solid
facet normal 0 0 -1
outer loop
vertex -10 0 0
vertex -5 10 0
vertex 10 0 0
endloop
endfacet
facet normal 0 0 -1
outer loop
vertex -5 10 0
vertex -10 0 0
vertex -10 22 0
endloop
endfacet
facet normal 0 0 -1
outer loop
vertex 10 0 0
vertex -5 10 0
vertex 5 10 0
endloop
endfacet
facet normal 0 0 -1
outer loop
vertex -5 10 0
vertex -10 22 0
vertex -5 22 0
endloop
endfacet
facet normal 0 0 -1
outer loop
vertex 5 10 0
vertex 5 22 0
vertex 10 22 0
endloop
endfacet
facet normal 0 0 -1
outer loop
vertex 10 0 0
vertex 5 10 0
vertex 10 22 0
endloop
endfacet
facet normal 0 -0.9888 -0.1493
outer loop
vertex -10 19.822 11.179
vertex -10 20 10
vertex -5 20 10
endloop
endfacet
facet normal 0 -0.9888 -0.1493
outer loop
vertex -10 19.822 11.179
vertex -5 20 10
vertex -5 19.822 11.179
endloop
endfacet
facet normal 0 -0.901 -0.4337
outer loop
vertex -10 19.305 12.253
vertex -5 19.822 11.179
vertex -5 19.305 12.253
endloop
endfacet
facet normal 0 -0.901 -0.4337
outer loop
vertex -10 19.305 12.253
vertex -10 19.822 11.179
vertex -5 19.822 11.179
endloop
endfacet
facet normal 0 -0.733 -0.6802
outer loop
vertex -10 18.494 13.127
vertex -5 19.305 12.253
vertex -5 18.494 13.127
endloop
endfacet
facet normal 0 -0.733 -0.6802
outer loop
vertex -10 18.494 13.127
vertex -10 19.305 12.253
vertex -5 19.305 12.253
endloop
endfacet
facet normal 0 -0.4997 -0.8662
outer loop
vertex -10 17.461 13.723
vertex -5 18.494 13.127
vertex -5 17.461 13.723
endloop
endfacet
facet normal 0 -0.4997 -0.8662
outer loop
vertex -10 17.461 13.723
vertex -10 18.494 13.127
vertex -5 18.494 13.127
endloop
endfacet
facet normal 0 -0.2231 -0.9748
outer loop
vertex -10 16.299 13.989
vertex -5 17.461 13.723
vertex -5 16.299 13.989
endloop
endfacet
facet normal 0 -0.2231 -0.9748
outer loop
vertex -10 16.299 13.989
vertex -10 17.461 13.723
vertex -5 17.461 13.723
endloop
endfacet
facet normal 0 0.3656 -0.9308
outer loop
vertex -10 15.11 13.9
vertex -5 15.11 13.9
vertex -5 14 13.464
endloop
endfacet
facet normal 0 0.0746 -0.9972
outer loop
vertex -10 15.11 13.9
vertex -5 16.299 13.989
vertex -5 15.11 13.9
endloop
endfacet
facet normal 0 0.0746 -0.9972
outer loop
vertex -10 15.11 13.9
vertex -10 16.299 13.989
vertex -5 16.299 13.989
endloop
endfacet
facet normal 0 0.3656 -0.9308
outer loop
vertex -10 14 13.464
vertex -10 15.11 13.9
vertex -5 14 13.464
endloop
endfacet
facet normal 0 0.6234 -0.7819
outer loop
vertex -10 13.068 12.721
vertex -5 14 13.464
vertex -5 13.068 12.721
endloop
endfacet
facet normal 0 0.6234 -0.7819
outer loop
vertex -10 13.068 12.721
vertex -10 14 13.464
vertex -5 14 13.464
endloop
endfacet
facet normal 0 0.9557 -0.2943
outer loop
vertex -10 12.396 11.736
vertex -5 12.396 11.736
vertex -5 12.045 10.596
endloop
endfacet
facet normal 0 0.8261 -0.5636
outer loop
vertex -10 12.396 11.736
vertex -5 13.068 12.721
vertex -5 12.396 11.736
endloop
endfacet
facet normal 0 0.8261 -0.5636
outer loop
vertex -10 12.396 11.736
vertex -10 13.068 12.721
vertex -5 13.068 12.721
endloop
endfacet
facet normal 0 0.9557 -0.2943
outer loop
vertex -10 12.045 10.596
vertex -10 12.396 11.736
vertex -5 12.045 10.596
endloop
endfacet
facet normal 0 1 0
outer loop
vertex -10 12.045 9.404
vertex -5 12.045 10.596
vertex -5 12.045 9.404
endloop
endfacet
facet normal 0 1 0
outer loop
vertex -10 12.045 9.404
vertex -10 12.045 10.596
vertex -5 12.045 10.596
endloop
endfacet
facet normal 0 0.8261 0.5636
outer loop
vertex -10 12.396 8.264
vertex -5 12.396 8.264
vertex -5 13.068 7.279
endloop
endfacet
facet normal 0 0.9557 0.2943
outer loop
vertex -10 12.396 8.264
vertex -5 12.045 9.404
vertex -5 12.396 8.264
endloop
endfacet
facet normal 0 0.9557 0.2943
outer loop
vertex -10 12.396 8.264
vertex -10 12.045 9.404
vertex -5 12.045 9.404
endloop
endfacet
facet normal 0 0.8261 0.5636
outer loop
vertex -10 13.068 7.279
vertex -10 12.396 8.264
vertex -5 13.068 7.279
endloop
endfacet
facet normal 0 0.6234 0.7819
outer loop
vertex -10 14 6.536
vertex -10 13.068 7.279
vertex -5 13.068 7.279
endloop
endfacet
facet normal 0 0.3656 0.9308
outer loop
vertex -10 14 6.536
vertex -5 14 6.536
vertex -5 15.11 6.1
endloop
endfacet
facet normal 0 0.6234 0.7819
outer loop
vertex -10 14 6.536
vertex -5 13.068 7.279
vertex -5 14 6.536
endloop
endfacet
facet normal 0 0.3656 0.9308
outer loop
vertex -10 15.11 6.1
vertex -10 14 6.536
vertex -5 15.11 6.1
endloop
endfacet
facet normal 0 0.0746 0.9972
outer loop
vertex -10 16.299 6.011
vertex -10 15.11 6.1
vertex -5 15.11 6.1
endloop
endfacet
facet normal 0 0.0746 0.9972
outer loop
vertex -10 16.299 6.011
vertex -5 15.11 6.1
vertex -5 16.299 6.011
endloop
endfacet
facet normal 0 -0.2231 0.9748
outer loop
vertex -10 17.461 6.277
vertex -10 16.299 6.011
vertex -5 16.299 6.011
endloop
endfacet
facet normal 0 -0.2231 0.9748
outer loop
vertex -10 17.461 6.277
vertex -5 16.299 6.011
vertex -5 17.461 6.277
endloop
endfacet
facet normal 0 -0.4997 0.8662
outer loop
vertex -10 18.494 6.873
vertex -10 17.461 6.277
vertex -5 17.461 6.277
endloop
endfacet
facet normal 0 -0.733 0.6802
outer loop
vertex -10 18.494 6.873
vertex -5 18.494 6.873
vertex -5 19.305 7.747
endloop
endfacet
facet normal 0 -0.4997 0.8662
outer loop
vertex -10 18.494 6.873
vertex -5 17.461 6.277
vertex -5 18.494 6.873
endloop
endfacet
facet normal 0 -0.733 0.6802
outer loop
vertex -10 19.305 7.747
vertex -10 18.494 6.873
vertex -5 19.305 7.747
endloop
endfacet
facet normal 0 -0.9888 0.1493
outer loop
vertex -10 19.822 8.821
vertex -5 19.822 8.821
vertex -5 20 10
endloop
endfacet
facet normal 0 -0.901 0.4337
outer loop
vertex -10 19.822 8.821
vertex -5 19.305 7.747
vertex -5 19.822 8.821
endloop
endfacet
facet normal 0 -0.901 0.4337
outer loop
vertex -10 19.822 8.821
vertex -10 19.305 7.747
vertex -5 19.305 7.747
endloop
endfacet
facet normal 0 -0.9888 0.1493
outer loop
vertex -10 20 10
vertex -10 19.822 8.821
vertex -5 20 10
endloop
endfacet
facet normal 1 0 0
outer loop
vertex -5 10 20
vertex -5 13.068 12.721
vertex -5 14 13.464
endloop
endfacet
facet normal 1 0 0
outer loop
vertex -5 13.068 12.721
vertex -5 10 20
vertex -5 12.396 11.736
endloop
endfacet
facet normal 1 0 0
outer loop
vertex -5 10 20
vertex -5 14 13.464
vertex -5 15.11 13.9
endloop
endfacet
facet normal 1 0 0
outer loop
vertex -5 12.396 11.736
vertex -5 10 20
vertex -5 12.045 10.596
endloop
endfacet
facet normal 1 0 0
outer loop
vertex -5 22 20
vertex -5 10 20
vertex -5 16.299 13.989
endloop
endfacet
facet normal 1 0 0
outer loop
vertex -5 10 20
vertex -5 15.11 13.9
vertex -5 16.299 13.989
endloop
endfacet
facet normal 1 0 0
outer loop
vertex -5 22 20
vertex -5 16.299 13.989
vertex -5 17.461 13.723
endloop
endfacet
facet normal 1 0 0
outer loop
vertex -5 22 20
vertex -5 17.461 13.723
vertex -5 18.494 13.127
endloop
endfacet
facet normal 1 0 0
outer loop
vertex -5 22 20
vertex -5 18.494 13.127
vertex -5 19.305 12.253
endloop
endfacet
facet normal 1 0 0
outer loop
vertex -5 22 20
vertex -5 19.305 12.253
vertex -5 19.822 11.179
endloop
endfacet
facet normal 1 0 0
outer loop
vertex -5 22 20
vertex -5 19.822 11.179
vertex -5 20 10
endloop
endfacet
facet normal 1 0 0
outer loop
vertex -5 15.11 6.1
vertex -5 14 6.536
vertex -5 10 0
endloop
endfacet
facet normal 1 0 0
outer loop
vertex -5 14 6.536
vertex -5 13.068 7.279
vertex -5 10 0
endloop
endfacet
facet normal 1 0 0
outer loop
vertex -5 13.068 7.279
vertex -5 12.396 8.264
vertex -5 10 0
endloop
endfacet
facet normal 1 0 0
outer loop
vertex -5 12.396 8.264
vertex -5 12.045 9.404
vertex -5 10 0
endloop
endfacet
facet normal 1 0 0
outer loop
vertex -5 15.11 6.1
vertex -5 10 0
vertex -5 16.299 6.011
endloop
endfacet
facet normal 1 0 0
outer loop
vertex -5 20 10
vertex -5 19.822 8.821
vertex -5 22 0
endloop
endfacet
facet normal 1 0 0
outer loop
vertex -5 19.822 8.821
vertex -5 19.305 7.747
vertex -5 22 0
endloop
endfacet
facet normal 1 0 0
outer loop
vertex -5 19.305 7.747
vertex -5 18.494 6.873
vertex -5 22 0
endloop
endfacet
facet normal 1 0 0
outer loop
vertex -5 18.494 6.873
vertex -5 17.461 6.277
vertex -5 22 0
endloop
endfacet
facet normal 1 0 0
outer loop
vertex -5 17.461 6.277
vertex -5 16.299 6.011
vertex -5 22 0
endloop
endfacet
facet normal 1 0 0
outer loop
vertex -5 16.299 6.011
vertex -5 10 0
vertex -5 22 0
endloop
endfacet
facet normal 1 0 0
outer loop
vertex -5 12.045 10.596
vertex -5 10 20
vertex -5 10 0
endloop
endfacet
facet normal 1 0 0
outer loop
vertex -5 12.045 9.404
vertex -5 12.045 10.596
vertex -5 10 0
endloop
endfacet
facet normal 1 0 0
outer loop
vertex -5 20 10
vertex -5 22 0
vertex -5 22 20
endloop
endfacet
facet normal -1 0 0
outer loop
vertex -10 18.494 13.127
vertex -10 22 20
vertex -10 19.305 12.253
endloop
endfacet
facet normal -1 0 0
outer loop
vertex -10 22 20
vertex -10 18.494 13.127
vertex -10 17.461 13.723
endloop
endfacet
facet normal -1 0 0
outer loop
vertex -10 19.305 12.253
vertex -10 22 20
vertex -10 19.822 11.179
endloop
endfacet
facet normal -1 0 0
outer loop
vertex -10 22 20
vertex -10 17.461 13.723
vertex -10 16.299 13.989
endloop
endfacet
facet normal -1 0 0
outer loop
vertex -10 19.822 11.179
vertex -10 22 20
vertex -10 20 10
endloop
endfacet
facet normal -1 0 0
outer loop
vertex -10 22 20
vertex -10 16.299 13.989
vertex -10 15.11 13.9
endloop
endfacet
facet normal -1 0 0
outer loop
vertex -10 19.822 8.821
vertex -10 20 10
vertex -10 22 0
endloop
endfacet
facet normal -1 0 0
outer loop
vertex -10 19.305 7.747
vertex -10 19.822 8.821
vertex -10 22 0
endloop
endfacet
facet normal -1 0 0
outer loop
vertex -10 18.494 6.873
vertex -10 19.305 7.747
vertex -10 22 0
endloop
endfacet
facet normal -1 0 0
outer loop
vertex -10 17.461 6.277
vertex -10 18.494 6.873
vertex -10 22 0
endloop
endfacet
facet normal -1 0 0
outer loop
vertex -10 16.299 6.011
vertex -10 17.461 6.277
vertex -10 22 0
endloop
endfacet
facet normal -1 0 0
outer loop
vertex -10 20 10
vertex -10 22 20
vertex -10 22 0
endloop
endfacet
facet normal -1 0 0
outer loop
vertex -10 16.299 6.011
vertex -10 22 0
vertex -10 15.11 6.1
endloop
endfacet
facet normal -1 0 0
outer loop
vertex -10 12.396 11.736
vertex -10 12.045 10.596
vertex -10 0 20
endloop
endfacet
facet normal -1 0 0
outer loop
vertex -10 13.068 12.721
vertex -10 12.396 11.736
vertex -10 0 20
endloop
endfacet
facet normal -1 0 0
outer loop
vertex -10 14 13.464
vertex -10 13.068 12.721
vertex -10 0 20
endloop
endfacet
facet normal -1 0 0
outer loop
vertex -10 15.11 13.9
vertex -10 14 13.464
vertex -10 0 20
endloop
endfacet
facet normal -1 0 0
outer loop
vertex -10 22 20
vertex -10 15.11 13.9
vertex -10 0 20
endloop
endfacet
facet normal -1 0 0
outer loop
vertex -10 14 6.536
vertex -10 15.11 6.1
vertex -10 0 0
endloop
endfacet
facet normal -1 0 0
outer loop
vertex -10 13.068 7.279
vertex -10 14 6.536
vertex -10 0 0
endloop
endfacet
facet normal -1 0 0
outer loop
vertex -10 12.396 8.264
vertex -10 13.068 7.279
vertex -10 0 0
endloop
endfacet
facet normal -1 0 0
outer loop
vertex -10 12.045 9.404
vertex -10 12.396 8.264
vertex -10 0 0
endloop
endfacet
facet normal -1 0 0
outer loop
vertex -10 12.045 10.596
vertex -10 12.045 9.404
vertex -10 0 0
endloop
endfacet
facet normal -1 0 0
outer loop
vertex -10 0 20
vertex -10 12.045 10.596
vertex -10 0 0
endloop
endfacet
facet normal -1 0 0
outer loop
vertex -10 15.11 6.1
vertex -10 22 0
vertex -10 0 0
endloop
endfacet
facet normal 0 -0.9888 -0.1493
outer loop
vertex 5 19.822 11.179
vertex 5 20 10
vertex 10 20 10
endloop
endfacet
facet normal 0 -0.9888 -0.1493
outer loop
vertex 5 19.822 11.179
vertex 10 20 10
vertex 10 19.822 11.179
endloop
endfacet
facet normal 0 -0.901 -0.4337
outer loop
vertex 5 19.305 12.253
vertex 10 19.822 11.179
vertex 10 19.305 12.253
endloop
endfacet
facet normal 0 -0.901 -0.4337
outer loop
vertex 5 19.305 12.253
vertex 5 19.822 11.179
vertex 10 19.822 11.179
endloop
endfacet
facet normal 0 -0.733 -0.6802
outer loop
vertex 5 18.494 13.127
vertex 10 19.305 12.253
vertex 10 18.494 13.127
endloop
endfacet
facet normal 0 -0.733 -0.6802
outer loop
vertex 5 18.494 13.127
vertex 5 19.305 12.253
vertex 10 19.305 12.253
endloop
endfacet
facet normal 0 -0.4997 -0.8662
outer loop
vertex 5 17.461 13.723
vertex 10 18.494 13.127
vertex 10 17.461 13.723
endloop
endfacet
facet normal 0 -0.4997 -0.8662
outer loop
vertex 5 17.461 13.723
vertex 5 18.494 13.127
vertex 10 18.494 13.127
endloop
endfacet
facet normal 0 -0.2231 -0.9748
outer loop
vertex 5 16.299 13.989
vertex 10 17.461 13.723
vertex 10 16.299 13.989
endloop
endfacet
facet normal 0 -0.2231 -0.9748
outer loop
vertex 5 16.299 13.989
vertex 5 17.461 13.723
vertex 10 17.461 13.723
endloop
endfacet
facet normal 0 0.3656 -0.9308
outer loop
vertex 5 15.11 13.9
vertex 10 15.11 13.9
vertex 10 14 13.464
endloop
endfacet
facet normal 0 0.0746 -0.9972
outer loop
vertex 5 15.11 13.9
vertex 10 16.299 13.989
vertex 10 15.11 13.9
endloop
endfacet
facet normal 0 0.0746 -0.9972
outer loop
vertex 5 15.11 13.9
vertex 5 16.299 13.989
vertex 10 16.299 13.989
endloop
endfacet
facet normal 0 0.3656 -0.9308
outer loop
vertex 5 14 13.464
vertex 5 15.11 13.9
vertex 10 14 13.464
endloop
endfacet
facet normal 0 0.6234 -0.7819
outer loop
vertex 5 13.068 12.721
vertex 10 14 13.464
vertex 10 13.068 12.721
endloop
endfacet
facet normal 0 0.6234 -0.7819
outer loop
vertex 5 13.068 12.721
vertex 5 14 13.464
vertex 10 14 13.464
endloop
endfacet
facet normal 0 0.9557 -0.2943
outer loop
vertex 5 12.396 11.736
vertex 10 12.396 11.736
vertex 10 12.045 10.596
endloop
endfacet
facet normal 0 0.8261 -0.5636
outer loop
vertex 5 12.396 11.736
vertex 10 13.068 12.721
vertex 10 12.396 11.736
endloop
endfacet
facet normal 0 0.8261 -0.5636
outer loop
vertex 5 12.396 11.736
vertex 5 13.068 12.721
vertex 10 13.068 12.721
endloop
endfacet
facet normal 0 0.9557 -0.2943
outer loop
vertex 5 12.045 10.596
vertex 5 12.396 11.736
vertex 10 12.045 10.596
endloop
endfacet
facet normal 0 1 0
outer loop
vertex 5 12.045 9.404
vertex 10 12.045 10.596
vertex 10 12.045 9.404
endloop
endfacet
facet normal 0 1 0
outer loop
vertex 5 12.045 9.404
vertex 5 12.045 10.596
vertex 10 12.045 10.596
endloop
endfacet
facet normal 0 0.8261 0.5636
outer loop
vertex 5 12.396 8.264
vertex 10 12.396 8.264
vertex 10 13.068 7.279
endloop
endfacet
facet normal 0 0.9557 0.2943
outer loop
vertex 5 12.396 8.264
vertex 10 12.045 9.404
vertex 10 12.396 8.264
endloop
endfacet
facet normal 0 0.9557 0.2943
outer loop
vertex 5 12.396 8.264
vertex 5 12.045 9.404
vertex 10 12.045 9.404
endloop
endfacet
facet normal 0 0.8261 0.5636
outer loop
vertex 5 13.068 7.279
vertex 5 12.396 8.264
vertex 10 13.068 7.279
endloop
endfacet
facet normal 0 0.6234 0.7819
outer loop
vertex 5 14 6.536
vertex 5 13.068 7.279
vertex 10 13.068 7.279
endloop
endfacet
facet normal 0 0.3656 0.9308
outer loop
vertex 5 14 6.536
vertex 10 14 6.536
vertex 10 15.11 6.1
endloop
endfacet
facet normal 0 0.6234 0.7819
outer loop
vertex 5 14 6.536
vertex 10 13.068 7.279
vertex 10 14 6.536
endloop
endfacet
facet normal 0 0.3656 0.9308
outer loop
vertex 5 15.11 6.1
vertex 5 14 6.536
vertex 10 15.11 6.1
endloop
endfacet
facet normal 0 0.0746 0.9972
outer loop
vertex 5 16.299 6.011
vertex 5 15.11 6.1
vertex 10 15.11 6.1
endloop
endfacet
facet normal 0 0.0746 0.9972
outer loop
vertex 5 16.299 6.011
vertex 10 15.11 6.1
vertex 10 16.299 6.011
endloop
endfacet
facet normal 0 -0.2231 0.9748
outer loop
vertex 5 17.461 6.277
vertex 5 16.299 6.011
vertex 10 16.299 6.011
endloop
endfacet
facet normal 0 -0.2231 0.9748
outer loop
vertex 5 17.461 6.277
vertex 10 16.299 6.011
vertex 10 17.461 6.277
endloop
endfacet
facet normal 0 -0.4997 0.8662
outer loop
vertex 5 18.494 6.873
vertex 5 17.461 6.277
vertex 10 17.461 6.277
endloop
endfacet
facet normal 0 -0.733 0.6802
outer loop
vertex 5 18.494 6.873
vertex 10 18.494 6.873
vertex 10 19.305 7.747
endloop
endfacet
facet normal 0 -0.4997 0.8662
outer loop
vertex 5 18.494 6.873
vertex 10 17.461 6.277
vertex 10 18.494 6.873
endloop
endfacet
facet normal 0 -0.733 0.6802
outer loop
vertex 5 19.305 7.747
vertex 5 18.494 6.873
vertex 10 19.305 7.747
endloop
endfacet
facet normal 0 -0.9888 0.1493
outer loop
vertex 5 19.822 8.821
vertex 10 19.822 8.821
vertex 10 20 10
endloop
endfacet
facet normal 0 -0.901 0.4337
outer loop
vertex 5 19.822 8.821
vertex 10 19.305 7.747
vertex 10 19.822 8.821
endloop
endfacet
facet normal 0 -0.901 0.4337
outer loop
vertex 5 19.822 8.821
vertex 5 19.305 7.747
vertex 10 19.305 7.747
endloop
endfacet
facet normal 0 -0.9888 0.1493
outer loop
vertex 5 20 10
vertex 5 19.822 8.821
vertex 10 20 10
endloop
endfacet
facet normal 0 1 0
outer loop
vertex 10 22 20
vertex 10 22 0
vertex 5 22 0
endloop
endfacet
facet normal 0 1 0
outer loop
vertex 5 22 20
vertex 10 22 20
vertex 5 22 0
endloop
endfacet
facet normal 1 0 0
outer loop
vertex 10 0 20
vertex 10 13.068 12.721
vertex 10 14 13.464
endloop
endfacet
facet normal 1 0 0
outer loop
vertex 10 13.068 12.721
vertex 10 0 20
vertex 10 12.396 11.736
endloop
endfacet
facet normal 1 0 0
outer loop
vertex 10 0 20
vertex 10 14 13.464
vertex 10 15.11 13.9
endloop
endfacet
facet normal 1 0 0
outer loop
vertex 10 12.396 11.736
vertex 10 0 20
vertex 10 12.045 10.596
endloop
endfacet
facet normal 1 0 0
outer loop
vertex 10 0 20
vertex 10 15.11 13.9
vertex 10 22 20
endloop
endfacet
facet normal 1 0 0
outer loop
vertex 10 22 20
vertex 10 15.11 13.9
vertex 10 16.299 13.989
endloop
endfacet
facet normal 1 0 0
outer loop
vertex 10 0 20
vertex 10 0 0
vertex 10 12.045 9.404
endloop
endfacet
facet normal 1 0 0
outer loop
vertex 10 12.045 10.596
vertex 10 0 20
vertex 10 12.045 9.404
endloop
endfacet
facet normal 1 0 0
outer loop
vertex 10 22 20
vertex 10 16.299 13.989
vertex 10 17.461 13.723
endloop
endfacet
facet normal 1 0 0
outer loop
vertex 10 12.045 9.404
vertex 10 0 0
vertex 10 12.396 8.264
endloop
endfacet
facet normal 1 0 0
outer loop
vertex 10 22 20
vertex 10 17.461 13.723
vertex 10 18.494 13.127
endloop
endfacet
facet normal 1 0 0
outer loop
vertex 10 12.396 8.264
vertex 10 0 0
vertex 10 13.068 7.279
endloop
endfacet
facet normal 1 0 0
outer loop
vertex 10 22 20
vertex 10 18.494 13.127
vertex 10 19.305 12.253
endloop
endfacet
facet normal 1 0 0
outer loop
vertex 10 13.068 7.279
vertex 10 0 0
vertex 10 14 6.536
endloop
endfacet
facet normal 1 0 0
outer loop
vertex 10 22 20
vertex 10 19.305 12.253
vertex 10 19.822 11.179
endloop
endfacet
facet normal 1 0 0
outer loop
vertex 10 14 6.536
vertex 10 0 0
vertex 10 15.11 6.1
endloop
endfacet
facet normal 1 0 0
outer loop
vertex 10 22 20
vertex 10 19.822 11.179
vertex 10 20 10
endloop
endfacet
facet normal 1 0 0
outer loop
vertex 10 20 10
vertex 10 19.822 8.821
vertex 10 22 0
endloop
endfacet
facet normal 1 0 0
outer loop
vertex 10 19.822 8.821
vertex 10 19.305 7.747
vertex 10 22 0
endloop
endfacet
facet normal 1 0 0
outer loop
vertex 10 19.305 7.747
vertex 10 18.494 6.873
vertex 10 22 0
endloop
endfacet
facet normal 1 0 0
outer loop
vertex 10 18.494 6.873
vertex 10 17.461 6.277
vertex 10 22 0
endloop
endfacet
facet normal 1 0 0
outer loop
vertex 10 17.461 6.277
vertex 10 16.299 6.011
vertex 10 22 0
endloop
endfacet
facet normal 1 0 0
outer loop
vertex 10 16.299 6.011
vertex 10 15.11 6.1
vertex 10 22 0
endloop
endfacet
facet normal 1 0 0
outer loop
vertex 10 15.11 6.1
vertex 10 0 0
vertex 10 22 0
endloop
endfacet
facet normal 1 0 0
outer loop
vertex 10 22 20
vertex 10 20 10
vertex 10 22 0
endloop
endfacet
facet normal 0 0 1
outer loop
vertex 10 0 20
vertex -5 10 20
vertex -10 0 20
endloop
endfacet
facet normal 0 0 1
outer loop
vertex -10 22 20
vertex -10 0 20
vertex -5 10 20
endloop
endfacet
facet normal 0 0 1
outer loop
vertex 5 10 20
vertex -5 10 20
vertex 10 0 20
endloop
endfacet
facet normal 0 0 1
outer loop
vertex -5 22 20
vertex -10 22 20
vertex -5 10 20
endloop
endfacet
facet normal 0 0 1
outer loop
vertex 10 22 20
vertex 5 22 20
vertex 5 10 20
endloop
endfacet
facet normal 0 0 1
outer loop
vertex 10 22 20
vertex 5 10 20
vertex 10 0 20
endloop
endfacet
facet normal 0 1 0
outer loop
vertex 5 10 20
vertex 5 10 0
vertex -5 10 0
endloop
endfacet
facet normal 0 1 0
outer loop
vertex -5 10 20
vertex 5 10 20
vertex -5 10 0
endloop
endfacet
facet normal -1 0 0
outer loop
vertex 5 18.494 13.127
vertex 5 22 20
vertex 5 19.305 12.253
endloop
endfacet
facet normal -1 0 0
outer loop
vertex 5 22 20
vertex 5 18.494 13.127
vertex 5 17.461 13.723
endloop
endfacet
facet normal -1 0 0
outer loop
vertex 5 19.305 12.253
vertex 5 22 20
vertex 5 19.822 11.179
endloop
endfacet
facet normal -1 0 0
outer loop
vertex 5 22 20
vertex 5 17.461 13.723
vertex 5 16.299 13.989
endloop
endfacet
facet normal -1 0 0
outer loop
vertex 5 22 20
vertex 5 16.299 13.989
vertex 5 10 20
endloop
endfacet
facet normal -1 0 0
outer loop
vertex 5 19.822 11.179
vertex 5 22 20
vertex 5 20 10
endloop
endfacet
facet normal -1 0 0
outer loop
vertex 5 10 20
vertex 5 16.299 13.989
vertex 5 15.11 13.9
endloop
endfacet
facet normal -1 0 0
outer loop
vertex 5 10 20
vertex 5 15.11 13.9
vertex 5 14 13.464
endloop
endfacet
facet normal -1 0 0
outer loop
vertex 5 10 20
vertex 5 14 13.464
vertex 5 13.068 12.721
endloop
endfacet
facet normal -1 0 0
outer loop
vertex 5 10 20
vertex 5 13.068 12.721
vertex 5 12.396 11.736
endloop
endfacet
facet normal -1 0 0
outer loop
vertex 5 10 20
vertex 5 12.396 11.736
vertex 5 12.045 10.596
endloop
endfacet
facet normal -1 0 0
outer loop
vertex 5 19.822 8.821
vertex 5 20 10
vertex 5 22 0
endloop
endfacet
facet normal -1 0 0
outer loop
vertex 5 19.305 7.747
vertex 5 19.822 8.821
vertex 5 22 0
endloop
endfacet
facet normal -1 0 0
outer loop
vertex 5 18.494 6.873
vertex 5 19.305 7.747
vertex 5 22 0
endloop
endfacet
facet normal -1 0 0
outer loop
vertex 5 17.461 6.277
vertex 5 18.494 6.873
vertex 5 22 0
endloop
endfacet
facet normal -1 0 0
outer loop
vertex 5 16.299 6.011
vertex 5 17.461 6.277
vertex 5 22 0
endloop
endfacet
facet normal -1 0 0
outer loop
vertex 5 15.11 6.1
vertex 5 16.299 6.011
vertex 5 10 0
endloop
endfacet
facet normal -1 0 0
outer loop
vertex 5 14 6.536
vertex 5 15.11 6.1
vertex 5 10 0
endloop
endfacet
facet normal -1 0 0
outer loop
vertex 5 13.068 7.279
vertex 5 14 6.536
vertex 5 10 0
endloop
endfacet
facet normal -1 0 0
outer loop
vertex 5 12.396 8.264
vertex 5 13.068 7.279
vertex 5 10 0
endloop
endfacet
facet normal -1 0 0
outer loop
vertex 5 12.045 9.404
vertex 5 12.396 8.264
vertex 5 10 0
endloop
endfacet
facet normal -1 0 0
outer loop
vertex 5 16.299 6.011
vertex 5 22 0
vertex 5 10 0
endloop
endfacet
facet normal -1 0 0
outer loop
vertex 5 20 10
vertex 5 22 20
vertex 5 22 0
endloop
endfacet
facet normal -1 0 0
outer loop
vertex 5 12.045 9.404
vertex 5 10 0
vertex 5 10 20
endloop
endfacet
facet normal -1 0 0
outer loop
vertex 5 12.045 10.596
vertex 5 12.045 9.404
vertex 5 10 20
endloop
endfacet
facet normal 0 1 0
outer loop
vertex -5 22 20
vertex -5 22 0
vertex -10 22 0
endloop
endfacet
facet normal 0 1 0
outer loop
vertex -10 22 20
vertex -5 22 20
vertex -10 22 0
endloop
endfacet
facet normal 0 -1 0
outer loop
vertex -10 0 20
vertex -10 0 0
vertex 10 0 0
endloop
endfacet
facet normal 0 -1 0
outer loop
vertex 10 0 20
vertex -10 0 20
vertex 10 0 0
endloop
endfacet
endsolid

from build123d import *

# Parameters (mm, degrees)
BOSS_EXTRU_1_DEPTH           = 20
ENL_V_MAT_EXTRU_1_DEPTH      = 34.301651611
ENL_V_MAT_EXTRU_1_DEPTH_BACK = 34.301651611
ESQUISSE2_R                  = 4


with BuildPart() as part:
    # Esquisse1 → Boss.-Extru.1 (new body)
    with BuildSketch(Plane.XY):
        Polygon((-10, 0), (10, 0), (10, 22), (5, 22), (5, 10), (-5, 10), (-5, 22), (-10, 22), align=None)
    extrude(amount=BOSS_EXTRU_1_DEPTH)

    # Esquisse2 → Enlèv. mat.-Extru.1 (cut, two sides: drawn at the far end of the back side and taken through both)
    with BuildSketch(Plane(origin=(-5, 0, 0), x_dir=(0, 0, -1), z_dir=(1, 0, 0)).offset(-ENL_V_MAT_EXTRU_1_DEPTH_BACK)):
        with Locations(Location((-10, 16, 0), (0, 0, 90))):
            Circle(ESQUISSE2_R)
    extrude(amount=ENL_V_MAT_EXTRU_1_DEPTH + ENL_V_MAT_EXTRU_1_DEPTH_BACK, mode=Mode.SUBTRACT)


solid = part.part
